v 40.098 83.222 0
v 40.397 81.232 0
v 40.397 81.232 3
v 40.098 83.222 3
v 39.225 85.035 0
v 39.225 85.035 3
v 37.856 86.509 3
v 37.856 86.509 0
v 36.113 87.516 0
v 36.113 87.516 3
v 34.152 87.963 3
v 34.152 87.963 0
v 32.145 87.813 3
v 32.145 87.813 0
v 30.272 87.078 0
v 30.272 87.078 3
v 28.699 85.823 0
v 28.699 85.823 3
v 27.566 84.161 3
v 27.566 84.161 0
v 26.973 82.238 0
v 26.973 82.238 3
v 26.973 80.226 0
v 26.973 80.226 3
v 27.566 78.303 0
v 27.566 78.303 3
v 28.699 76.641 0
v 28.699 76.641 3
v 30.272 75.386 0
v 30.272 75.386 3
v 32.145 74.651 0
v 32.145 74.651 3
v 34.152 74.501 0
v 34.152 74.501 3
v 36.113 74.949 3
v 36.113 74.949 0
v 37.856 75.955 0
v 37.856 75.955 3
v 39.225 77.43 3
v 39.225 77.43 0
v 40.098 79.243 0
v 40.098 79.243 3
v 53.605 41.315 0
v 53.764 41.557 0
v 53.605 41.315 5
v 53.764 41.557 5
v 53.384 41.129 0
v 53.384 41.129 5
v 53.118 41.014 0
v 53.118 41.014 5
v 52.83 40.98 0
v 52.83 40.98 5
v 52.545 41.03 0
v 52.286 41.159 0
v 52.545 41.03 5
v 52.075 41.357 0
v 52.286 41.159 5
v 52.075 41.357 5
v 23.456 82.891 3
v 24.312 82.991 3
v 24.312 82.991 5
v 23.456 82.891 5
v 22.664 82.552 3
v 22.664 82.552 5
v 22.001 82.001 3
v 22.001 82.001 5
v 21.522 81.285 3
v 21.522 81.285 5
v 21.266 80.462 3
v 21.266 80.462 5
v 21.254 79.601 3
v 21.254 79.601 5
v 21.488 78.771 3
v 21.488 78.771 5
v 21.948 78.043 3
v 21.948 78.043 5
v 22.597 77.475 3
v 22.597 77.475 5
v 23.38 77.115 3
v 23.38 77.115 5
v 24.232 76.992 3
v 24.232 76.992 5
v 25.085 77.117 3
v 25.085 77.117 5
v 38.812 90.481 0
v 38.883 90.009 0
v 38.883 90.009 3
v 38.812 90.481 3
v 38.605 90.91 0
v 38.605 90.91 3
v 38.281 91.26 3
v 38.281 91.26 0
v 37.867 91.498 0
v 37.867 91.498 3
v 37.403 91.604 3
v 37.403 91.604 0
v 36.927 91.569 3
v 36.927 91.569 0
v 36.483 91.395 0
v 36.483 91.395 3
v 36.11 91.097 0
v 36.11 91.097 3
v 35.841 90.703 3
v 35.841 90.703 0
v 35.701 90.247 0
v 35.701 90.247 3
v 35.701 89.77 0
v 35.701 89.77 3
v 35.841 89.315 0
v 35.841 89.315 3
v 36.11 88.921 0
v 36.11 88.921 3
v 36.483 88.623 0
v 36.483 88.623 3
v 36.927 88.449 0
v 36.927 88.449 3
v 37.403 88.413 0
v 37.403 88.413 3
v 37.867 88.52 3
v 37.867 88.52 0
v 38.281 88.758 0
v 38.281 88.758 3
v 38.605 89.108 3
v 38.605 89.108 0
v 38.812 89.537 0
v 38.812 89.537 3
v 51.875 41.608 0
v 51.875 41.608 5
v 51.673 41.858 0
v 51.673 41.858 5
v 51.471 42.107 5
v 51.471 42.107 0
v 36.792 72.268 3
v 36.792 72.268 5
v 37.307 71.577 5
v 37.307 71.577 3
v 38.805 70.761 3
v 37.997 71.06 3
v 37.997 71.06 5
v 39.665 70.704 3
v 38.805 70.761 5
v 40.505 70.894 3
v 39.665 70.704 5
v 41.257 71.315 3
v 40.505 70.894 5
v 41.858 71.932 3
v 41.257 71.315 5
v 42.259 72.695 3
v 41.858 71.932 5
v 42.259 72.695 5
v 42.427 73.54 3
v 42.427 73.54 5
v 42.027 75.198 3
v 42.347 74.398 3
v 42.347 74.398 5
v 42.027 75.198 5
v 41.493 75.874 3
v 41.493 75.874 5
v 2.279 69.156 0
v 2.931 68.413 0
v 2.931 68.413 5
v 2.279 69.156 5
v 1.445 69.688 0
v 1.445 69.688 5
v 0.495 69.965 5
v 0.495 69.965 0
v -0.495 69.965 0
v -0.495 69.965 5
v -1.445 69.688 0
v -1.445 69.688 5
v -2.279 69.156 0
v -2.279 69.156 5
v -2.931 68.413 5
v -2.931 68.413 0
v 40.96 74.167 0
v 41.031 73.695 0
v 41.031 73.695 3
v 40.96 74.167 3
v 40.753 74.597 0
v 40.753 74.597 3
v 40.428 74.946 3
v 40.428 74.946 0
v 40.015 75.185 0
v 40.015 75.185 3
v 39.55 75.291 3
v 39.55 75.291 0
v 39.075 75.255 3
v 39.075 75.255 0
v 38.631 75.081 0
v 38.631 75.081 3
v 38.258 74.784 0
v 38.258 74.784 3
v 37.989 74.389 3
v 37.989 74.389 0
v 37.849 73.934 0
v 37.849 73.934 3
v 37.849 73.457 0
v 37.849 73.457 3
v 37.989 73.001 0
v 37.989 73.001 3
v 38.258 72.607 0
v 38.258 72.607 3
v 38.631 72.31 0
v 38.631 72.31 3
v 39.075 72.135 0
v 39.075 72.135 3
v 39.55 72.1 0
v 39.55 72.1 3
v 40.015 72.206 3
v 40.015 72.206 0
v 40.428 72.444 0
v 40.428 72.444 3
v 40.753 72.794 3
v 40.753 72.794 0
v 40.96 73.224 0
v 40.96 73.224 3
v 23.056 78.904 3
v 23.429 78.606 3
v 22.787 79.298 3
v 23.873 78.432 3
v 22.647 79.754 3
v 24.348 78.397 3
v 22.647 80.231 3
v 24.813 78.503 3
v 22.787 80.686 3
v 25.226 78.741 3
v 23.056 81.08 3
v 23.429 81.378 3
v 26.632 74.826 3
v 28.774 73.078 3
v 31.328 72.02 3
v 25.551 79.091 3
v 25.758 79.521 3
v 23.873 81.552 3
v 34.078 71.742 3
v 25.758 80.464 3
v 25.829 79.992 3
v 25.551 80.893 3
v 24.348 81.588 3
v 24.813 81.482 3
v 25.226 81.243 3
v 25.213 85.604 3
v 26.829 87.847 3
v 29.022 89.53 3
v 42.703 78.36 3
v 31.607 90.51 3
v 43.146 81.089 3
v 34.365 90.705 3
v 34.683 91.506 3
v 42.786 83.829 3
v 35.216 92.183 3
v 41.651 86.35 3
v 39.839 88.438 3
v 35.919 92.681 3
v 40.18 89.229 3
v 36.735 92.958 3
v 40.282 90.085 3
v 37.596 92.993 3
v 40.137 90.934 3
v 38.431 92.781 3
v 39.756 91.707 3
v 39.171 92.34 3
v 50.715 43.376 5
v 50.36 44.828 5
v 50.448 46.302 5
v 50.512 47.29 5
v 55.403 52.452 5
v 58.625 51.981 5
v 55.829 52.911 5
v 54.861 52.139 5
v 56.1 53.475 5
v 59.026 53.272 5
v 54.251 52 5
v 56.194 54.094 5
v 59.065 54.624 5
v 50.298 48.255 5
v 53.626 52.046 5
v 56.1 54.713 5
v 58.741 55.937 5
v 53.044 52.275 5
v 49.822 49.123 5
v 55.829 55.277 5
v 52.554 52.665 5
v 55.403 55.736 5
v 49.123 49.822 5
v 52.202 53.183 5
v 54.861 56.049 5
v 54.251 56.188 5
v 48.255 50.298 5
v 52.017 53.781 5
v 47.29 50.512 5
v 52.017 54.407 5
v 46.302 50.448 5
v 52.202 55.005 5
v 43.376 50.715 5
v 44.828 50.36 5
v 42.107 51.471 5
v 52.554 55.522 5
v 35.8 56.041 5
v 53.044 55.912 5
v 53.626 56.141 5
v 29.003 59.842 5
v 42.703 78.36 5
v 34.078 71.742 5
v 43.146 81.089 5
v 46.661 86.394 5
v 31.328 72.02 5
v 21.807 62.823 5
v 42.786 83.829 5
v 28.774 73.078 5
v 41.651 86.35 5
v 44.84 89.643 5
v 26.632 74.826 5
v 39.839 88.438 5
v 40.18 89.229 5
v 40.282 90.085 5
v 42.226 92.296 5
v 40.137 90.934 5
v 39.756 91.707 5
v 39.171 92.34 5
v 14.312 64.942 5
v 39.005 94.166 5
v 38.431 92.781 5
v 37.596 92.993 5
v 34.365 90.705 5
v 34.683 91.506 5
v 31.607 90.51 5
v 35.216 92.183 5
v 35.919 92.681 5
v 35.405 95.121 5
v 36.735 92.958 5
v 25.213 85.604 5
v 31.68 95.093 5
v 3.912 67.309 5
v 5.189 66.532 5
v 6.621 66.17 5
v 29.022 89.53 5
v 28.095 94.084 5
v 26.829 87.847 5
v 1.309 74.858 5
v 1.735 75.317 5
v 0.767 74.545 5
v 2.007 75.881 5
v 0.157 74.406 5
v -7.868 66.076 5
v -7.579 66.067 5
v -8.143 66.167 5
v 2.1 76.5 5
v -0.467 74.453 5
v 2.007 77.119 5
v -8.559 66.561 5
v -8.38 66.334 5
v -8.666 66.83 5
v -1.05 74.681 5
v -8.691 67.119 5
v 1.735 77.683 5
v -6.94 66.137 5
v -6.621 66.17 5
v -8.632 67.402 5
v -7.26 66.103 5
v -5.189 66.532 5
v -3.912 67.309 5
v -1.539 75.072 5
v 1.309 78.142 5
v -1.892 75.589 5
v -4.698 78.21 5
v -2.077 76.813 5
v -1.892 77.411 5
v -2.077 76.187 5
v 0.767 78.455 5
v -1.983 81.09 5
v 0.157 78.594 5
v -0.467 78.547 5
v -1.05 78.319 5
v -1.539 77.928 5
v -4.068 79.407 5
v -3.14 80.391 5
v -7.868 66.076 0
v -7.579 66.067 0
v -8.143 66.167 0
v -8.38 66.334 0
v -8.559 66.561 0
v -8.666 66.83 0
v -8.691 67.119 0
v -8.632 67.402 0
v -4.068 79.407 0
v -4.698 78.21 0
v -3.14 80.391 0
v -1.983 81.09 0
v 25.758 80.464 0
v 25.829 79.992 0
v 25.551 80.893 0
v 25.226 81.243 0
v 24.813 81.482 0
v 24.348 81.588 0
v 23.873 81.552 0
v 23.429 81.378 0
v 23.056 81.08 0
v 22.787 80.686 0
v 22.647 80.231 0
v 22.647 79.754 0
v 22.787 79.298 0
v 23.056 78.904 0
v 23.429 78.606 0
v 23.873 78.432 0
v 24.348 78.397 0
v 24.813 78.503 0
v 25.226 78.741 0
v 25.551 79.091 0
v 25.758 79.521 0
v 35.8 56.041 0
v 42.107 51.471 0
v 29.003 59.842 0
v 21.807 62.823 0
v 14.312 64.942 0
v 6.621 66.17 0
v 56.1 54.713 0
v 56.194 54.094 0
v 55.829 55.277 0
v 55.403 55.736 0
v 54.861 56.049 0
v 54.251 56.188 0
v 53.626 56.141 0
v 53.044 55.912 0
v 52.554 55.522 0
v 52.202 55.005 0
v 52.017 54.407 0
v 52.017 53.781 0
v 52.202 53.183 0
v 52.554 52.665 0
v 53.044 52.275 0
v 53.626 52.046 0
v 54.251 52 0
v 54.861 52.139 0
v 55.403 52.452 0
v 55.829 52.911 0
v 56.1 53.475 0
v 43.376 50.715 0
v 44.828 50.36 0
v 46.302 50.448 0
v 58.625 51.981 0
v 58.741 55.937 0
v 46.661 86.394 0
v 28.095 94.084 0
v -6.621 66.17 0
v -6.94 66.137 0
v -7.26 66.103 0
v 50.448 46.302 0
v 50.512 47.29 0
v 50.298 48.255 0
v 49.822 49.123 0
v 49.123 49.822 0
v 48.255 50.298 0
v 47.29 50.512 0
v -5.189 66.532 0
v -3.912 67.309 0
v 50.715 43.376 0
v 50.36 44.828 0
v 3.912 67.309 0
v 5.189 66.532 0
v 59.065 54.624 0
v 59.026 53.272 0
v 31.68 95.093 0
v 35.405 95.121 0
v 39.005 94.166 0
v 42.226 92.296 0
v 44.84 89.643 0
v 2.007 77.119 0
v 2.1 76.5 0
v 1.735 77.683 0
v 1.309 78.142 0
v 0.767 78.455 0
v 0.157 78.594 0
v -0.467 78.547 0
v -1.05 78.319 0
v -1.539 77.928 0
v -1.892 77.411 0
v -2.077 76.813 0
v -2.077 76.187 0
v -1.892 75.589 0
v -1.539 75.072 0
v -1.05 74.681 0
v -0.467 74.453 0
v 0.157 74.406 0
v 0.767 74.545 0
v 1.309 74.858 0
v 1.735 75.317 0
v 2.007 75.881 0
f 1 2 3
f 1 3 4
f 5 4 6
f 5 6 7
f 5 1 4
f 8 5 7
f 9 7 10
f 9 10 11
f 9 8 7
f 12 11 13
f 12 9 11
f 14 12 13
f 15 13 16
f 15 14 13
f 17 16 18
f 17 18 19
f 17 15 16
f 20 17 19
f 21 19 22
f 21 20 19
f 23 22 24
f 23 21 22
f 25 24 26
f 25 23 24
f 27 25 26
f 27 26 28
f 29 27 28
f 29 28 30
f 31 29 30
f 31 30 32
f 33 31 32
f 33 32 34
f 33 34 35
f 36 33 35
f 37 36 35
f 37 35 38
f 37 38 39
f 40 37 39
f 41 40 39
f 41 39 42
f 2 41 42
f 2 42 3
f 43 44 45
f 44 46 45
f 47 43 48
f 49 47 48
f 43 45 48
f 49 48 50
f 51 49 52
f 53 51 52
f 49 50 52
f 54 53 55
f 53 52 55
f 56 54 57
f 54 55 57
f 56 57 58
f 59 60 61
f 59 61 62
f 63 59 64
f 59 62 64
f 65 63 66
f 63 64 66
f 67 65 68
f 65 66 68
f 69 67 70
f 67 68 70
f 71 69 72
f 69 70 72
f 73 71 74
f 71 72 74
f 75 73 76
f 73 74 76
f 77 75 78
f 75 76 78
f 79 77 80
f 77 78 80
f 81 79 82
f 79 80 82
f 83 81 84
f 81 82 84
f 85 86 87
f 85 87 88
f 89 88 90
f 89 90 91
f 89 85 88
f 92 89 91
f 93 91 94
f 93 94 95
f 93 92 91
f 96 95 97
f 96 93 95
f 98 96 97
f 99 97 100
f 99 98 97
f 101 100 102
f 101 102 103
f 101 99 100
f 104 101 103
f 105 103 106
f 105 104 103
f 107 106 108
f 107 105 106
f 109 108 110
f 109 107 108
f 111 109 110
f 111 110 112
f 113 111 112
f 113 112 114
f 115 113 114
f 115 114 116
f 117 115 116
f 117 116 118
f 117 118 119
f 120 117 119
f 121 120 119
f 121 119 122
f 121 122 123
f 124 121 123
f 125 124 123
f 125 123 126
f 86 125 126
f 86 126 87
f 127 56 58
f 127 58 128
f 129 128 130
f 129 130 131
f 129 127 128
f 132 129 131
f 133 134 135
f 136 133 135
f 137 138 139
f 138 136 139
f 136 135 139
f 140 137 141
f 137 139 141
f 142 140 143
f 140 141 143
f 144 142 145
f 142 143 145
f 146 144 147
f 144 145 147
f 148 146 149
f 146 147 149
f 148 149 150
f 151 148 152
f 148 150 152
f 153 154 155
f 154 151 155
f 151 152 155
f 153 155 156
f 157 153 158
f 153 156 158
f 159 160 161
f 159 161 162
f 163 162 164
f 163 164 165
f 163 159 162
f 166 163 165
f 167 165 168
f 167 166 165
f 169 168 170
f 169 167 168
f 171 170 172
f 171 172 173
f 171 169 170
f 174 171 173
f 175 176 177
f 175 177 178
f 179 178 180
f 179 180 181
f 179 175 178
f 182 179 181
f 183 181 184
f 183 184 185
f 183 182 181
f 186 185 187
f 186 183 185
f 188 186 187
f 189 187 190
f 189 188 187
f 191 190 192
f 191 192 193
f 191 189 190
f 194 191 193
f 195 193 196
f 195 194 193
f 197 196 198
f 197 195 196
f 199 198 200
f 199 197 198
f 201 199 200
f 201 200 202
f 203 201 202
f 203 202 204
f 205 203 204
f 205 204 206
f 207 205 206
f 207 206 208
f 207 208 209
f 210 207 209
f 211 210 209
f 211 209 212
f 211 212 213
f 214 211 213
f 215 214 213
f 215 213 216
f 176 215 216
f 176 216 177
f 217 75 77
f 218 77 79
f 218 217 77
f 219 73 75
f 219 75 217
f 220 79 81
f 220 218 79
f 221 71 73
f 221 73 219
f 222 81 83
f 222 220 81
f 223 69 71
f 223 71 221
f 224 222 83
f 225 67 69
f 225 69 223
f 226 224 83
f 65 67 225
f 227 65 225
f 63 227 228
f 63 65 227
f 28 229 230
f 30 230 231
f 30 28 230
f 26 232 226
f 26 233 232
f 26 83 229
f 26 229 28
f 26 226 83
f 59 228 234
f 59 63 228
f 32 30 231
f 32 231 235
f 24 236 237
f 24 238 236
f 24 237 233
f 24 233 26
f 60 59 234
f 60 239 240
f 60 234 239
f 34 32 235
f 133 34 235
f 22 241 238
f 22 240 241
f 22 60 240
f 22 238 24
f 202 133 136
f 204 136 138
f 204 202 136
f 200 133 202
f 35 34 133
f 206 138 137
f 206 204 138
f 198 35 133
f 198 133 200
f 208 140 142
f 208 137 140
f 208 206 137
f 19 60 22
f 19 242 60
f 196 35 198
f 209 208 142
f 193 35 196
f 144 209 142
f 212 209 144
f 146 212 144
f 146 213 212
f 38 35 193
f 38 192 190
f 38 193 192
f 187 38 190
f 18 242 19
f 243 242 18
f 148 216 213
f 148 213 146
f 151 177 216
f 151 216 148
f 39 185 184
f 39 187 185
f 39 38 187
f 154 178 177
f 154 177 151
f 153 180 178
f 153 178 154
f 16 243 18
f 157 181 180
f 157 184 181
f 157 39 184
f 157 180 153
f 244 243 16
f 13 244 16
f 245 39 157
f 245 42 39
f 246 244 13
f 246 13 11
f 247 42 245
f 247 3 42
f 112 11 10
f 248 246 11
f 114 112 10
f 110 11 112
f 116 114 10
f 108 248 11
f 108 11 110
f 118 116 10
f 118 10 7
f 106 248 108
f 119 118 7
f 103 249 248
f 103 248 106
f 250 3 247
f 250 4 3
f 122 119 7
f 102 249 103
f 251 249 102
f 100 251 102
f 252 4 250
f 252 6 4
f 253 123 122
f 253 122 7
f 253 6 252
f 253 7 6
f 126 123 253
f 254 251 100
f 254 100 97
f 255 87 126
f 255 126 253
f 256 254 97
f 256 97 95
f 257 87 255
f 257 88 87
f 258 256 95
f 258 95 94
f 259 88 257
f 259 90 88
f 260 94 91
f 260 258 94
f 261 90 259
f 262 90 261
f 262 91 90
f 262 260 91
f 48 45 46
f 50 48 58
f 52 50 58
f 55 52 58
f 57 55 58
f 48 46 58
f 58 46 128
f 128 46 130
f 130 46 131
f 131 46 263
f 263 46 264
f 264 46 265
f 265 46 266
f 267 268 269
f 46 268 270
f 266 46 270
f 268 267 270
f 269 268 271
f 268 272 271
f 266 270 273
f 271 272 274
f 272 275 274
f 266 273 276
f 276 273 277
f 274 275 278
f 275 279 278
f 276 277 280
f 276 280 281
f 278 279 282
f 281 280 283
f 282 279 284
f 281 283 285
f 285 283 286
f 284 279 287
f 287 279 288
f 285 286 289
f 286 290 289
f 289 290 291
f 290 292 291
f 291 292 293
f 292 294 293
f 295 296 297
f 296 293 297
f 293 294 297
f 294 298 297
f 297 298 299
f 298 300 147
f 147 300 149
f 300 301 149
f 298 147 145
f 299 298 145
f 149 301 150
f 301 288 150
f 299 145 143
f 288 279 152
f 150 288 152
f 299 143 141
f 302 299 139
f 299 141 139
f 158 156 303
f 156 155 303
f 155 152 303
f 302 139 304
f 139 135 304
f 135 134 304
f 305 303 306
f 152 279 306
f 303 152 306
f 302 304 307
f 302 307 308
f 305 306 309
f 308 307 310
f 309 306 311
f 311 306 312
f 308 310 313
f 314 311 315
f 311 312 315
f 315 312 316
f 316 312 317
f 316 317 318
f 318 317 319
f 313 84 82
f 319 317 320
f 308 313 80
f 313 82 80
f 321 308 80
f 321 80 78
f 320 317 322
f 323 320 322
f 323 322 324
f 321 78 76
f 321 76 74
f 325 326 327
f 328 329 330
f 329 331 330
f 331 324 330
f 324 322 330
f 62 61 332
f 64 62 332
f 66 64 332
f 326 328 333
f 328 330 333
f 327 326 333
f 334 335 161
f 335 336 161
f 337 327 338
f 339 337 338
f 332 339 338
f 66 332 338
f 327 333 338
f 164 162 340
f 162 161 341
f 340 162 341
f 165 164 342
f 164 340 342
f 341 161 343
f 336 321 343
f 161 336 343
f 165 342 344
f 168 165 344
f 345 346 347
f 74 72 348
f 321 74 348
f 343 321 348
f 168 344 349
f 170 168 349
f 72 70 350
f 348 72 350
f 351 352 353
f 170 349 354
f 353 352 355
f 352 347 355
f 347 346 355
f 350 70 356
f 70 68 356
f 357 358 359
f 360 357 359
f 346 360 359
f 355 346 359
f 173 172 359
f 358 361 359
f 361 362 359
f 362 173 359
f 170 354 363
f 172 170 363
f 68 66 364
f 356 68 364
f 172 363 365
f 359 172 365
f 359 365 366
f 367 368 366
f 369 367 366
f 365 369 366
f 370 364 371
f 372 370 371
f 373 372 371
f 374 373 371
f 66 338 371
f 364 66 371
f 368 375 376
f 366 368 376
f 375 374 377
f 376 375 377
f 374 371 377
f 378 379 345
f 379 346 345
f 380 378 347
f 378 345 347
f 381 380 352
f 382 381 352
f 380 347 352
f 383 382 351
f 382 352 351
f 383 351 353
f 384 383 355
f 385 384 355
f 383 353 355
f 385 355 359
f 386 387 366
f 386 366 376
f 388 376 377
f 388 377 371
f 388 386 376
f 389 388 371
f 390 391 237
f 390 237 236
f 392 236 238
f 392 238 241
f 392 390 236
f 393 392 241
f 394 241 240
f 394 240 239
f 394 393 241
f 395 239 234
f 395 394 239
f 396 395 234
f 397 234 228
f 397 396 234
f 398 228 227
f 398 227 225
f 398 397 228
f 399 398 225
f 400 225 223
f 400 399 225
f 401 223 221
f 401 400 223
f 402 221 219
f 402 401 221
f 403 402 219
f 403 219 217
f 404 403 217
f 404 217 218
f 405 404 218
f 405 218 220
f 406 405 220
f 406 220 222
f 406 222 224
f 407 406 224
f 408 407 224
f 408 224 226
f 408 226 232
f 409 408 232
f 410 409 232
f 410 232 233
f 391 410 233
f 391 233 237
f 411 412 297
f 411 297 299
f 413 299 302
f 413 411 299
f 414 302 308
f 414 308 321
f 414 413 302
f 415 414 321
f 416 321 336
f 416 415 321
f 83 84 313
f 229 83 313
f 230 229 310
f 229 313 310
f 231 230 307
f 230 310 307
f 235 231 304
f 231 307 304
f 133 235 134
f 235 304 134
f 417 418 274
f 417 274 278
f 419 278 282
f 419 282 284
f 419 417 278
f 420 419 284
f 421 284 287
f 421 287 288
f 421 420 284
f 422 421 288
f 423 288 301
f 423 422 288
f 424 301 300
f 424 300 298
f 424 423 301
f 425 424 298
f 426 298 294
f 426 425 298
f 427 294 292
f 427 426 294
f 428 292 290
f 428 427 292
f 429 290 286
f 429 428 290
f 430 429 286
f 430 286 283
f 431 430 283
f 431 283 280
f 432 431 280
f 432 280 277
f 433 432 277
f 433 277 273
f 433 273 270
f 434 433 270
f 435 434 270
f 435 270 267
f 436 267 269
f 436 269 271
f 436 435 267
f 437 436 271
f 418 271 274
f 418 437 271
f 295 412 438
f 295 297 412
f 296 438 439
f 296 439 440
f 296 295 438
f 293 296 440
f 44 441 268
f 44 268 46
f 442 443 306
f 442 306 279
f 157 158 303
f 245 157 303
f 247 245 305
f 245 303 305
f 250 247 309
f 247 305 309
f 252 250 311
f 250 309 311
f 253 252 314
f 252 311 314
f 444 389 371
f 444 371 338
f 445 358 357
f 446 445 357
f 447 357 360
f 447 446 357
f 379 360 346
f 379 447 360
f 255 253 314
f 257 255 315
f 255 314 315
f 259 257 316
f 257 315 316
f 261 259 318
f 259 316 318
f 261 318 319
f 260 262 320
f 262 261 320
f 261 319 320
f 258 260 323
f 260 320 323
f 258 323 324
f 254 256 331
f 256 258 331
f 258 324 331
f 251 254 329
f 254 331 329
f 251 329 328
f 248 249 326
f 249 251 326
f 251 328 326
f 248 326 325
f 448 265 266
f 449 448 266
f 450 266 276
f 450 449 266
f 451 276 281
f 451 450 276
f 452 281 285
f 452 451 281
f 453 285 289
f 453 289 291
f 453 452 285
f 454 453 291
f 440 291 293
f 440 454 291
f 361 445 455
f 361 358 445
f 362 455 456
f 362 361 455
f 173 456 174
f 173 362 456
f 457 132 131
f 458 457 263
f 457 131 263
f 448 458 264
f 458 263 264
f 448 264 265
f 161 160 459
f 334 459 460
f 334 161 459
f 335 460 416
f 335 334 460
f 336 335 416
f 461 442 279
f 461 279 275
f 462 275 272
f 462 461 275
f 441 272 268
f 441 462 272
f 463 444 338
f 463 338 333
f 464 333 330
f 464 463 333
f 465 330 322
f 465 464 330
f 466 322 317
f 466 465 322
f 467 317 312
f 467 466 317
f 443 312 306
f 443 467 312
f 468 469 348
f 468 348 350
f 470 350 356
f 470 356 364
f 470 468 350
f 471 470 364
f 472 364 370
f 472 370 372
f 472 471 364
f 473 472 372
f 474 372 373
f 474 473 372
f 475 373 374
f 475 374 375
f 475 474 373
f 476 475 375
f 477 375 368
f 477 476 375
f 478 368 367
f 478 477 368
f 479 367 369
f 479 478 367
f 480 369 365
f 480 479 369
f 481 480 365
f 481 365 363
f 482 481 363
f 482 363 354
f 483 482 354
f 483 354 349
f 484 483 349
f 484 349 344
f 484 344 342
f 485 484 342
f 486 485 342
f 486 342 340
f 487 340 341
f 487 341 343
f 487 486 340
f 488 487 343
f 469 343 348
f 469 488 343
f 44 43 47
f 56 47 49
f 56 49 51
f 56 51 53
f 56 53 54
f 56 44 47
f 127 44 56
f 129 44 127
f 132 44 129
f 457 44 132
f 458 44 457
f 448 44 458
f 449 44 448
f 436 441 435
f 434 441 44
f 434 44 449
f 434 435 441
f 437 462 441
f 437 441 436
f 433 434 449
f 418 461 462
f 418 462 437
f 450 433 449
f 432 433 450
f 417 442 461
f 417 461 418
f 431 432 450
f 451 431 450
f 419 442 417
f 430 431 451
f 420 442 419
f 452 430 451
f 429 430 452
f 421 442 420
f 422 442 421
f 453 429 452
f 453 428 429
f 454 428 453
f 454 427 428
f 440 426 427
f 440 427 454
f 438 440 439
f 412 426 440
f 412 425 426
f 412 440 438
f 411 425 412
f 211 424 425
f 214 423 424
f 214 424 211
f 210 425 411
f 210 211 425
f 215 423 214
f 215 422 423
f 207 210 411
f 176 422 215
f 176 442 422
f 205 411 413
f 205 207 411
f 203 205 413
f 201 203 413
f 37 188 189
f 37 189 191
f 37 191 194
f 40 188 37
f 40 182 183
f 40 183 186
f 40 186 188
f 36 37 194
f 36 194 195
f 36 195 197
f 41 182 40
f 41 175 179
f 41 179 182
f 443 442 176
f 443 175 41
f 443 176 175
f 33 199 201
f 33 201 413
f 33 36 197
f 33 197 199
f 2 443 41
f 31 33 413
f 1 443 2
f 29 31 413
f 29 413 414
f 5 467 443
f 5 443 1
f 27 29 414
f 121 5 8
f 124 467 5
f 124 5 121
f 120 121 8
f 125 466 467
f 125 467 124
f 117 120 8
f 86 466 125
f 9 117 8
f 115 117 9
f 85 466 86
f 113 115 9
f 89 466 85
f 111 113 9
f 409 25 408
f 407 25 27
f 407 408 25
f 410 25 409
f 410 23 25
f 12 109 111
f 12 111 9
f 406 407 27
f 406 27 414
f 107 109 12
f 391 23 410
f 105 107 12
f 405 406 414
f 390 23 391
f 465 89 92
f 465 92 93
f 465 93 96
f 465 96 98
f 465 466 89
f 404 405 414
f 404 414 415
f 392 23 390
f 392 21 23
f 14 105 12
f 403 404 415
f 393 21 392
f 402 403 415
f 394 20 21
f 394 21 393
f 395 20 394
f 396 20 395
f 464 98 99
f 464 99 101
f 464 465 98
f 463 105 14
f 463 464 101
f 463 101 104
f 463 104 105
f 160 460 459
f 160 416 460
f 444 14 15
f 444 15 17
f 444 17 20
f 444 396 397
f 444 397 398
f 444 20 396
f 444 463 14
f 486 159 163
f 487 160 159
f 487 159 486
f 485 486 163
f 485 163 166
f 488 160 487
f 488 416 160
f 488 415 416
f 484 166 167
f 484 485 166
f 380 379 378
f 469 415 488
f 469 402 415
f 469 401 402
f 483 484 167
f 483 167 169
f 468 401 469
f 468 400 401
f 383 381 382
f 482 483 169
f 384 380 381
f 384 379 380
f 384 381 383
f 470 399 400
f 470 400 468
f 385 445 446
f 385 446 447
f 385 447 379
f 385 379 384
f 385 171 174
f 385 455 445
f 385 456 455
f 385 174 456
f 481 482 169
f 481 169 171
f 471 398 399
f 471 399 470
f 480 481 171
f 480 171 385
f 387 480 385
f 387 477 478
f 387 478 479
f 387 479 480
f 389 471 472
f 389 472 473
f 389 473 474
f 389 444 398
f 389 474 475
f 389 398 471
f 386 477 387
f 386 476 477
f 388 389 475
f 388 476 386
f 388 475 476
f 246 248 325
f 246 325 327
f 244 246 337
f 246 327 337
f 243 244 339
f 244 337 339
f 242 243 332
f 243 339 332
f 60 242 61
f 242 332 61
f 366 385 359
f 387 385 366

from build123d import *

# Parameters (mm, degrees)
SKETCH_3_R          = 1.6
SKETCH_3_R_2        = 6.75
SKETCH_3_R_3        = 2.1
EXTRUDE_1_DEPTH     = 5
FILLET_1_R          = 5
FILLET_2_R          = 1
SKETCH_4_R          = 3
CUT_EXTRUDE_1_DEPTH = 2
SKETCH_5_R          = 9.5
CUT_EXTRUDE_2_DEPTH = 2


with BuildPart() as part:
    # Sketch 3 → Extrude 1 (new body)
    with BuildSketch(Plane.XY):
        with BuildLine():
            Line((-1.982924342, 81.089990311), (28.095252633, 94.084080766))
            ThreePointArc((28.095252633, 94.084080766), (39.005008844, 94.166421351), (46.661147856, 86.393835167))
            Line((46.661147856, 86.393835167), (58.741421284, 55.937142786))
            ThreePointArc((58.741421284, 55.937142786), (59.091513319, 53.946870364), (58.625207696, 51.980577452))
            Line((58.625207696, 51.980577452), (53.071542706, 40.070704446))
            ThreePointArc((53.071542706, 40.070704446), (51.29898623, 42.316238157), (49.431489328, 44.483456058))
            ThreePointArc((49.431489328, 44.483456058), (49.497474683, 49.497474683), (44.483456058, 49.431489328))
            ThreePointArc((44.483456058, 49.431489328), (25.448448252, 61.437988912), (3.498787879, 66.407894737))
            ThreePointArc((3.498787879, 66.407894737), (0, 70), (-3.498787879, 66.407894737))
            ThreePointArc((-3.498787879, 66.407894737), (-6.351762076, 66.195959986), (-9.192980894, 65.861514576))
            Line((-9.192980894, 65.861514576), (-4.698463104, 78.210100717))
            ThreePointArc((-4.698463104, 78.210100717), (-3.637811921, 79.930207637), (-1.982924342, 81.089990311))
        make_face()
        with Locations((37.282933398, 90.008963455)):
            Circle(SKETCH_3_R, mode=Mode.SUBTRACT)
        with Locations((39.430674366, 73.695251163)):
            Circle(SKETCH_3_R, mode=Mode.SUBTRACT)
        with Locations((24.228714608, 79.99210907)):
            Circle(SKETCH_3_R, mode=Mode.SUBTRACT)
        with Locations((33.647440791, 81.232107896)):
            Circle(SKETCH_3_R_2, mode=Mode.SUBTRACT)
        with Locations((0, 76.5)):
            Circle(SKETCH_3_R_3, mode=Mode.SUBTRACT)
        with Locations((54.093668761, 54.093668761)):
            Circle(SKETCH_3_R_3, mode=Mode.SUBTRACT)
    extrude(amount=EXTRUDE_1_DEPTH)

    # Fillet 1
    fillet_1_edges = [part.edges().sort_by_distance(p)[0] for p in [
        (49.431489328, 44.483456058, 2.5),
        (44.483456058, 49.431489328, 2.5),
        (3.498787879, 66.407894737, 2.5),
        (-3.498787879, 66.407894737, 2.5),
    ]]
    fillet(fillet_1_edges, radius=FILLET_1_R)

    # Fillet 2
    fillet_2_edges = [part.edges().sort_by_distance(p)[0] for p in [
        (53.071542706, 40.070704446, 2.5),
        (-9.192980894, 65.861514576, 2.5),
    ]]
    fillet(fillet_2_edges, radius=FILLET_2_R)

    # Sketch 4 → Cut-Extrude 1 (cut)
    with BuildSketch(Plane.XY.offset(5)):
        with Locations((37.282933398, 90.008963455)):
            Circle(SKETCH_4_R)
        with Locations((39.430674366, 73.695251163)):
            Circle(SKETCH_4_R)
        with Locations((24.228714608, 79.99210907)):
            Circle(SKETCH_4_R)
    extrude(amount=-CUT_EXTRUDE_1_DEPTH, mode=Mode.SUBTRACT)

    # Sketch 5 → Cut-Extrude 2 (cut)
    with BuildSketch(Plane.XY.offset(5)):
        with Locations((33.647440791, 81.232107896)):
            Circle(SKETCH_5_R)
    extrude(amount=-CUT_EXTRUDE_2_DEPTH, mode=Mode.SUBTRACT)


solid = part.part
